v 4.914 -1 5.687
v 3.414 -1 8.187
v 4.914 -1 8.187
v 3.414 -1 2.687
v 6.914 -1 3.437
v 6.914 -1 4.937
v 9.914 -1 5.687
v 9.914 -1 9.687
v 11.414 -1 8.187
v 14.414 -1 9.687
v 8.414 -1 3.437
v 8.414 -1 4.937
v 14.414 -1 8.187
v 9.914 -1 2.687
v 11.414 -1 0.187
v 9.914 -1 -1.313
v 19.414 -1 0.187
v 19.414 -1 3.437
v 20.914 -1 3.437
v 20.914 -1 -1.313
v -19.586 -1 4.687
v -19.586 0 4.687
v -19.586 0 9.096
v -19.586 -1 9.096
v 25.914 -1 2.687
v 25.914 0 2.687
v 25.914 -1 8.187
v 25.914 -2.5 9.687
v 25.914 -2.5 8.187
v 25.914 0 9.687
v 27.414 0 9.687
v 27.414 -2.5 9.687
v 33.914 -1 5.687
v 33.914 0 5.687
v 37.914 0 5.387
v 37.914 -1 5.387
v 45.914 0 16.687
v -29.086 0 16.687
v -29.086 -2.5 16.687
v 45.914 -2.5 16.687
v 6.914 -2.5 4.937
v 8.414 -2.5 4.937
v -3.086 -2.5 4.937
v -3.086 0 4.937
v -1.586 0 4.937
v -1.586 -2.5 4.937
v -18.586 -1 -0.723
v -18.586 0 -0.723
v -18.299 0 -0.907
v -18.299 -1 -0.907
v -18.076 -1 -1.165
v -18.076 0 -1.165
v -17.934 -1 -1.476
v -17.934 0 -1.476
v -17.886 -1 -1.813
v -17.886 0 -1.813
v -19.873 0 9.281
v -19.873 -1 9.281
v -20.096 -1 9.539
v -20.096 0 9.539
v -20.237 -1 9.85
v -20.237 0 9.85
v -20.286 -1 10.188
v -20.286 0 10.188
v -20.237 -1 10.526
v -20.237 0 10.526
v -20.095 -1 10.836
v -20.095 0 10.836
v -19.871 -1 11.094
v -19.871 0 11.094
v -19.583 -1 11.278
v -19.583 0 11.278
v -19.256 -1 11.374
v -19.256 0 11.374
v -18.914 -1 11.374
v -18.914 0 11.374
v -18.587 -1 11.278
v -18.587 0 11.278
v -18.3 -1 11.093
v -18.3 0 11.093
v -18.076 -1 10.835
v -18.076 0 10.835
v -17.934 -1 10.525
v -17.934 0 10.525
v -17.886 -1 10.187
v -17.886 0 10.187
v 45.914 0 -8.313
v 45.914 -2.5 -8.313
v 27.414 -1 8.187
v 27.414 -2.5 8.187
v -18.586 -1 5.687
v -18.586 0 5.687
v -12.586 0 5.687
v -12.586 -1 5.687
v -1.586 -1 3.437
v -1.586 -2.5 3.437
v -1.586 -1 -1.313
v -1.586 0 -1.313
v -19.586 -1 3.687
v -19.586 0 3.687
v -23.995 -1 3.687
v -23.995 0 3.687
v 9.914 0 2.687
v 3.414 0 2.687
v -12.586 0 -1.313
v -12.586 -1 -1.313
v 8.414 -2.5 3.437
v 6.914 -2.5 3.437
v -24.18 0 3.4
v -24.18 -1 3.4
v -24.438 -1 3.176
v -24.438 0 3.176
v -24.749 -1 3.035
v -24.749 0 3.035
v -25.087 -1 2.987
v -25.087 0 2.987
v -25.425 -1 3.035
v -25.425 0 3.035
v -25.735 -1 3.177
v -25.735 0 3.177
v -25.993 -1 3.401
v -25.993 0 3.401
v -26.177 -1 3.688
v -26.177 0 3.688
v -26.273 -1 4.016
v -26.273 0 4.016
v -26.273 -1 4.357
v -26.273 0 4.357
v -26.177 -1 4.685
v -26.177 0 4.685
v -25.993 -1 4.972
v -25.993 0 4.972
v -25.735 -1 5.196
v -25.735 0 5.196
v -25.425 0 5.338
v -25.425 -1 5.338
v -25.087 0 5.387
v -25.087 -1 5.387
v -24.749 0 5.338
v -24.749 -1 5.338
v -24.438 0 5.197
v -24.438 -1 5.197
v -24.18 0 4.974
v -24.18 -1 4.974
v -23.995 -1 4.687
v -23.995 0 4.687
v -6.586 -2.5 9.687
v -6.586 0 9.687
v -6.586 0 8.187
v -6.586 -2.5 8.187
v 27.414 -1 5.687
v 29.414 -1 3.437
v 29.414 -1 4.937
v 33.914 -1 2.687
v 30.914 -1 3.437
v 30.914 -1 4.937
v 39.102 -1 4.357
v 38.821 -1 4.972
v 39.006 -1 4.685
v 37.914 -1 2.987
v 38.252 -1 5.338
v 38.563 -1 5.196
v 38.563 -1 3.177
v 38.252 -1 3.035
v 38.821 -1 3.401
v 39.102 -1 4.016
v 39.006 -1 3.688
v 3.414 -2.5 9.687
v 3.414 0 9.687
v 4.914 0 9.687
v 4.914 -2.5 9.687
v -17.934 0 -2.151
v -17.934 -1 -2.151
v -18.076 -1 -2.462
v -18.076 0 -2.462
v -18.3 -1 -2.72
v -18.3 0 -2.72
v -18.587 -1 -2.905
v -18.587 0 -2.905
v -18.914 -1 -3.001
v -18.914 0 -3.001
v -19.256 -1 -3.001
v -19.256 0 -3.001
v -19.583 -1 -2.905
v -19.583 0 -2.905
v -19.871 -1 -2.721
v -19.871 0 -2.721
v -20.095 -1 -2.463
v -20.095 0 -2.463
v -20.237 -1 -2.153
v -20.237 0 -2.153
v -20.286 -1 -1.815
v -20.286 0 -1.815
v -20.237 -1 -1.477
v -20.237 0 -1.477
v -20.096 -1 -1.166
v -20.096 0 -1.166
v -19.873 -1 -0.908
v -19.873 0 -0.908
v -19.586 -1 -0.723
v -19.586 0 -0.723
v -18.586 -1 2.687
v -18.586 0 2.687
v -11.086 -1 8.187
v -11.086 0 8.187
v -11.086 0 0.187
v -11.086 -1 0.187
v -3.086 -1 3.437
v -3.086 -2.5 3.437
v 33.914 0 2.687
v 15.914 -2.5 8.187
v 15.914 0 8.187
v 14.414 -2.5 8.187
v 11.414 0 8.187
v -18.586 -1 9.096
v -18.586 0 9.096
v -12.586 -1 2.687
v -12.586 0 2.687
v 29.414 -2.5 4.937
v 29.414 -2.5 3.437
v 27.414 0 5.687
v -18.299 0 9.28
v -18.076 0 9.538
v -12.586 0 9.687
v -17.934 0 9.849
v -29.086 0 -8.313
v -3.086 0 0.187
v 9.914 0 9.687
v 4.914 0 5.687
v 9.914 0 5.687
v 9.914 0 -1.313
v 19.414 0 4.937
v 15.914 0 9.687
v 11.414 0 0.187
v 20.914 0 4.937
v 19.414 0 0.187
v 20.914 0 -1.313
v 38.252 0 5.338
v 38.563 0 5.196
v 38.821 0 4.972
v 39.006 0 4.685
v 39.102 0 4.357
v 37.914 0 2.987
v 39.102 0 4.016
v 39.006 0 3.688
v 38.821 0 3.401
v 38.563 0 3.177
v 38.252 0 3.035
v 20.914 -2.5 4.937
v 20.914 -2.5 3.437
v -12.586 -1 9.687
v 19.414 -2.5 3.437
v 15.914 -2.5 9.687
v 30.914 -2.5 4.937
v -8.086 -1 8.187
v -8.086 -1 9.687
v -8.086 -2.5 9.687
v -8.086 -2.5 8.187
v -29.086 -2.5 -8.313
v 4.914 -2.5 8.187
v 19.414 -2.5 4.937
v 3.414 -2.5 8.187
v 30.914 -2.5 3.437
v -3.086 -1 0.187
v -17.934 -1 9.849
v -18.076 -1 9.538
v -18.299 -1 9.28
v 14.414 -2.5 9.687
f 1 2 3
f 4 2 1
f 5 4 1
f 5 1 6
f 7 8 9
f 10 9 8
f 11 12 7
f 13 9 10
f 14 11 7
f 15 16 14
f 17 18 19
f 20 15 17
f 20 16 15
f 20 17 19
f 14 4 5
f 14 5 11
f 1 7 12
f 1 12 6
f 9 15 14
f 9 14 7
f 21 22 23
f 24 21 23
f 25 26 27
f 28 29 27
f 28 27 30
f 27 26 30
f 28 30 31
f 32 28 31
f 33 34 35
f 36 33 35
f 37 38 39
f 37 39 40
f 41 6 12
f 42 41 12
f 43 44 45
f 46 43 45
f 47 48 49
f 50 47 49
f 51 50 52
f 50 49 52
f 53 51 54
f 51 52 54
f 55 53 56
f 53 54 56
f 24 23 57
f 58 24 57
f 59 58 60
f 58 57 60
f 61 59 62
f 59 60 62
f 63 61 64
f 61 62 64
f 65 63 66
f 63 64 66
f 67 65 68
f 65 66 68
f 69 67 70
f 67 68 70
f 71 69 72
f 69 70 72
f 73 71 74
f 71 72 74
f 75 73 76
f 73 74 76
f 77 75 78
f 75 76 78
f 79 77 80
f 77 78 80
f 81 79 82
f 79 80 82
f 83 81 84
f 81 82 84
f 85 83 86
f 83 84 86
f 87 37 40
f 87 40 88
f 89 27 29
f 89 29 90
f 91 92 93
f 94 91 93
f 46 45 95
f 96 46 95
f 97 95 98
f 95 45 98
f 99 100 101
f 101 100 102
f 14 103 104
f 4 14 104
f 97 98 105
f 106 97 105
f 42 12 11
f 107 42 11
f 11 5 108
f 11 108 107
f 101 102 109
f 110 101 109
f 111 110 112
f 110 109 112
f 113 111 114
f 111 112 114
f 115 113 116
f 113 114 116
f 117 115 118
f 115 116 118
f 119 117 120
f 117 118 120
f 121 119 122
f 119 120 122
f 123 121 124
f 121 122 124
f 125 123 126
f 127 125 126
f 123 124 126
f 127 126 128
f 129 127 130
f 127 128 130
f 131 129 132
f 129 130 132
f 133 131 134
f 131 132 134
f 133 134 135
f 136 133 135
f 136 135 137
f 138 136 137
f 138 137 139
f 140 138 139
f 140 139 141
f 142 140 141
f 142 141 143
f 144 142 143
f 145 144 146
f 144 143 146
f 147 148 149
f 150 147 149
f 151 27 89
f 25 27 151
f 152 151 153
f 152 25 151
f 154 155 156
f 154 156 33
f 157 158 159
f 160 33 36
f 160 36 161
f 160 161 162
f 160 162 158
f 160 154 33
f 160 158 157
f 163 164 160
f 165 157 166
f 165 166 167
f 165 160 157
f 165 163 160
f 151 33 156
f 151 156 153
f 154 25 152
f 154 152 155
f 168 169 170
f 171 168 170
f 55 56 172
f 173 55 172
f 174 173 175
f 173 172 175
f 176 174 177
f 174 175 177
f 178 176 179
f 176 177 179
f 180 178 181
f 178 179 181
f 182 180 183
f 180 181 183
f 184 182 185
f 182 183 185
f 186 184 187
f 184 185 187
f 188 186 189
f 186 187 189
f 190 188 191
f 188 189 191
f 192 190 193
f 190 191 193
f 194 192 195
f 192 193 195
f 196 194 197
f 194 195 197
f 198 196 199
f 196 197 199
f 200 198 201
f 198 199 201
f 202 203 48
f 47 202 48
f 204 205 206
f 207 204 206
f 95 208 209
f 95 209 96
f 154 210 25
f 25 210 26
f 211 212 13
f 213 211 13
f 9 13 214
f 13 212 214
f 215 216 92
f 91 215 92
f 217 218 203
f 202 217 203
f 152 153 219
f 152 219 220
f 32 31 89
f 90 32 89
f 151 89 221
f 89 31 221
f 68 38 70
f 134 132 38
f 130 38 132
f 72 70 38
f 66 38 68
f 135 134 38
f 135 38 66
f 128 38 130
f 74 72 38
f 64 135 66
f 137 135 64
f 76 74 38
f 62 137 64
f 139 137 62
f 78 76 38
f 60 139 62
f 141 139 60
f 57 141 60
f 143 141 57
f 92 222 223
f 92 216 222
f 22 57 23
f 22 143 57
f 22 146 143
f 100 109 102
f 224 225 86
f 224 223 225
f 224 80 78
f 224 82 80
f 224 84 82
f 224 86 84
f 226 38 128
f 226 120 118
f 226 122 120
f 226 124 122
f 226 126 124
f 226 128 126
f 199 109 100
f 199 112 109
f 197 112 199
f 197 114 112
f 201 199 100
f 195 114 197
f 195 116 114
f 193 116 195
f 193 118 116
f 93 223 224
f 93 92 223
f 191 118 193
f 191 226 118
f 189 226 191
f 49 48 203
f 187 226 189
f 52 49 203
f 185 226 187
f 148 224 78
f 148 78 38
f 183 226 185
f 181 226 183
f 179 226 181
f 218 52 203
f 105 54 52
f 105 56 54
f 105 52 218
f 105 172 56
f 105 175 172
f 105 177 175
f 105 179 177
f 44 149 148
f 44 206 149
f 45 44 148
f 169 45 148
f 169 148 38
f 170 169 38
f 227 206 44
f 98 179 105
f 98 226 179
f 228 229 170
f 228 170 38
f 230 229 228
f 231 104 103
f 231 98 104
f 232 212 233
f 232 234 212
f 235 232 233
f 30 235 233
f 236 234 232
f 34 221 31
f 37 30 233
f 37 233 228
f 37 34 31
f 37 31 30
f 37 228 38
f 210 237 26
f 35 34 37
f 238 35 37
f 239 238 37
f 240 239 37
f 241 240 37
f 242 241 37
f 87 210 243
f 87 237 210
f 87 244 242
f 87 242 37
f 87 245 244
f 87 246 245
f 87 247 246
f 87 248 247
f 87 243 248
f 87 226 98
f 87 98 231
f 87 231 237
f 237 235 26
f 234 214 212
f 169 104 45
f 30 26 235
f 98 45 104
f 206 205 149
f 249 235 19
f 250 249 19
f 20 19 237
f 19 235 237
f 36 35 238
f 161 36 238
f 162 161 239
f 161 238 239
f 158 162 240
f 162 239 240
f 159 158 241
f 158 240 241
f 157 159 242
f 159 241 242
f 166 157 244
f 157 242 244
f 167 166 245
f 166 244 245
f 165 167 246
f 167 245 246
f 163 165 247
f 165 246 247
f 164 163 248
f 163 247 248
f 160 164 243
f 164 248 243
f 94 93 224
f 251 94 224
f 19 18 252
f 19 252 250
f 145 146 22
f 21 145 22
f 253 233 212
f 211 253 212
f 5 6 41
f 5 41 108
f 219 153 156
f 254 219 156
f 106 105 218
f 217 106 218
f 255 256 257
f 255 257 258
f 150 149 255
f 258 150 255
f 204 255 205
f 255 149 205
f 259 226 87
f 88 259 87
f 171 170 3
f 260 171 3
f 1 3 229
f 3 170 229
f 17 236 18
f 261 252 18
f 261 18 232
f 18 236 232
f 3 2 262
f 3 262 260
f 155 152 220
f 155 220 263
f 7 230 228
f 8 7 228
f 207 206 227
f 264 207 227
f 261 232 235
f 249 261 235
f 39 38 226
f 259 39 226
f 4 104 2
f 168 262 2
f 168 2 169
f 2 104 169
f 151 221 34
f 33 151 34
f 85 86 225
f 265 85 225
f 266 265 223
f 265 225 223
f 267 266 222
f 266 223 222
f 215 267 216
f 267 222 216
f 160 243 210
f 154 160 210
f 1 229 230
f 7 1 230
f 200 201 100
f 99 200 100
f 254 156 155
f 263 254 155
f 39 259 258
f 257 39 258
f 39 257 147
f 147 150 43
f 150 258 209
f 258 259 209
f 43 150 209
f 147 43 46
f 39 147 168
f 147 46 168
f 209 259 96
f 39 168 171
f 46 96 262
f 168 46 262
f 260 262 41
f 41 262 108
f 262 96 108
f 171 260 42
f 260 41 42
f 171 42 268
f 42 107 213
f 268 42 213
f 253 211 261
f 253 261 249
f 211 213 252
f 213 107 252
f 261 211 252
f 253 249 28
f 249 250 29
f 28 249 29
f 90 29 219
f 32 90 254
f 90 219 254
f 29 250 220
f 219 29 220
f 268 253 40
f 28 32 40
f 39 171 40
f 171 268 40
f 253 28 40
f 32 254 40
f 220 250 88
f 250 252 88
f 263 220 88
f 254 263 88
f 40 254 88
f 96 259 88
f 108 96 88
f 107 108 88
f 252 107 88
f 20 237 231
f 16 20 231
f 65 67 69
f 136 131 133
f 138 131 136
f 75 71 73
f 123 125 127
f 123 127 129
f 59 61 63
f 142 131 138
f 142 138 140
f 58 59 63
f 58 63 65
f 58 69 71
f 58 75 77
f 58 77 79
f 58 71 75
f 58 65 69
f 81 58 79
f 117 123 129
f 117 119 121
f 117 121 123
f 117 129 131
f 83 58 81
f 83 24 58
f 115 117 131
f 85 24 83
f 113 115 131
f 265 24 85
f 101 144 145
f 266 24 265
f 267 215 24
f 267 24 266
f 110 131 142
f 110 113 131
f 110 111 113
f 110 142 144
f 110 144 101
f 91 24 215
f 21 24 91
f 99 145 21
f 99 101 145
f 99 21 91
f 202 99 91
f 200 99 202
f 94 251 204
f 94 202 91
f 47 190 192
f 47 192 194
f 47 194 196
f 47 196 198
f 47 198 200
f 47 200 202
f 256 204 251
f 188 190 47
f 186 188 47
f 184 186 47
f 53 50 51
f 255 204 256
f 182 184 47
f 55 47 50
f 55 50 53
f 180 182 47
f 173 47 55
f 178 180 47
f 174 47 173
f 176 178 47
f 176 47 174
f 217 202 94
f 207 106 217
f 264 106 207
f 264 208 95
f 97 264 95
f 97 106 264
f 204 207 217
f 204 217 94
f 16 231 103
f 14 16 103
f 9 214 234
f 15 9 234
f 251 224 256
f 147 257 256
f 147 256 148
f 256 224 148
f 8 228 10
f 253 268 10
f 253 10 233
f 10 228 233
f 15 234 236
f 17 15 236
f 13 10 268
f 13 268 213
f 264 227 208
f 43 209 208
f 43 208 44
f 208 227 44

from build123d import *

# Parameters (mm, degrees)
SKETCH2_W           = 75
SKETCH2_H           = 25
BOSS_EXTRUDE1_DEPTH = 2.5
CUT_EXTRUDE1_DEPTH  = 1
SKETCH3_W           = 1.5
SKETCH3_H           = 1.5
CUT_EXTRUDE2_DEPTH  = 3.5
SKETCH4_W           = 0.5
SKETCH4_H           = 1
CUT_EXTRUDE3_DEPTH  = 1


with BuildPart() as part:
    # Sketch2 → Boss-Extrude1 (new body)
    with BuildSketch(Plane(origin=(0, 0, 0), x_dir=(1, 0, 0), z_dir=(0, 1, 0))):
        with Locations((8.414308894, -4.186562074)):
            Rectangle(SKETCH2_W, SKETCH2_H)
    extrude(amount=-BOSS_EXTRUDE1_DEPTH)

    # Sketch1 → Cut-Extrude1 (cut)
    with BuildSketch(Plane(origin=(0, 0, 0), x_dir=(1, 0, 0), z_dir=(0, 1, 0))):
        Polygon((-12.585691106, -2.686562074), (-19.085691106, -2.686562074), (-19.085691106, -5.686562074), (-12.585691106, -5.686562074), (-12.585691106, -9.686562074), (-6.585691106, -9.686562074), (-6.585691106, -8.186562074), (-11.085691106, -8.186562074), (-11.085691106, -0.186562074), (-3.085691106, -0.186562074), (-3.085691106, -4.936562074), (-1.585691106, -4.936562074), (-1.585691106, 1.313437926), (-12.585691106, 1.313437926), align=None)
        Polygon((9.914308894, -2.686562074), (3.414308894, -2.686562074), (3.414308894, -9.686562074), (4.914308894, -9.686562074), (4.914308894, -5.686562074), (9.914308894, -5.686562074), (9.914308894, -9.686562074), (15.914308894, -9.686562074), (15.914308894, -8.186562074), (11.414308894, -8.186562074), (11.414308894, -0.186562074), (19.414308894, -0.186562074), (19.414308894, -4.936562074), (20.914308894, -4.936562074), (20.914308894, 1.313437926), (9.914308894, 1.313437926), align=None)
        Polygon((33.914308894, -2.686562074), (25.914308894, -2.686562074), (25.914308894, -9.686562074), (27.414308894, -9.686562074), (27.414308894, -5.686562074), (33.914308894, -5.686562074), align=None)
    extrude(amount=-CUT_EXTRUDE1_DEPTH, mode=Mode.SUBTRACT)

    # Sketch3 → Cut-Extrude2 (cut, through all)
    with BuildSketch(Plane(origin=(0, 0, 0), x_dir=(1, 0, 0), z_dir=(0, 1, 0))):
        with Locations((-7.335691106, -8.936562074)):
            Rectangle(SKETCH3_W, SKETCH3_H)
        with Locations((-2.335691106, -4.186562074)):
            Rectangle(SKETCH3_W, SKETCH3_H)
        with Locations((4.164308894, -8.936562074)):
            Rectangle(SKETCH3_W, SKETCH3_H)
        with Locations((30.164308894, -4.186562074)):
            Rectangle(SKETCH3_W, SKETCH3_H)
        with Locations((7.664308894, -4.186562074)):
            Rectangle(SKETCH3_W, SKETCH3_H)
        with Locations((15.164308894, -8.936562074)):
            Rectangle(SKETCH3_W, SKETCH3_H)
        with Locations((20.164308894, -4.186562074)):
            Rectangle(SKETCH3_W, SKETCH3_H)
        with Locations((26.664308894, -8.936562074)):
            Rectangle(SKETCH3_W, SKETCH3_H)
    extrude(amount=-CUT_EXTRUDE2_DEPTH, mode=Mode.SUBTRACT)

    # Sketch4 → Cut-Extrude3 (cut)
    with BuildSketch(Plane(origin=(0, 0, 0), x_dir=(1, 0, 0), z_dir=(0, 1, 0))):
        with BuildLine():
            ThreePointArc((37.914308894, -5.386562074), (39.114308894, -4.186562074), (37.914308894, -2.986562074))
            Line((37.914308894, -2.986562074), (33.914308894, -2.686562074))
            Line((33.914308894, -2.686562074), (33.914308894, -5.686562074))
            Line((33.914308894, -5.686562074), (37.914308894, -5.386562074))
        make_face()
        with BuildLine():
            ThreePointArc((-17.885691106, 1.813437926), (-19.733765176, 2.82338842), (-19.585691106, 0.722566715))
            Line((-19.585691106, 0.722566715), (-19.585691106, 1.813437926))
            ThreePointArc((-19.585691106, 1.813437926), (-19.085691106, 2.313437926), (-18.585691106, 1.813437926))
            Line((-18.585691106, 1.813437926), (-18.585691106, 0.722566715))
            ThreePointArc((-18.585691106, 0.722566715), (-18.075740612, 1.165363856), (-17.885691106, 1.813437926))
        make_face()
        with BuildLine():
            Line((-19.585691106, 1.813437926), (-19.585691106, 0.722566715))
            ThreePointArc((-19.585691106, 0.722566715), (-19.085691106, 0.613437926), (-18.585691106, 0.722566715))
            Line((-18.585691106, 0.722566715), (-18.585691106, 1.813437926))
            ThreePointArc((-18.585691106, 1.813437926), (-19.085691106, 2.313437926), (-19.585691106, 1.813437926))
        make_face()
        with BuildLine():
            Line((-19.585691106, 0.722566715), (-19.585691106, -3.686562074))
            Line((-19.585691106, -3.686562074), (-19.085691106, -3.686562074))
            Line((-19.085691106, -3.686562074), (-19.085691106, -2.686562074))
            Line((-19.085691106, -2.686562074), (-18.585691106, -2.686562074))
            Line((-18.585691106, -2.686562074), (-18.585691106, 0.722566715))
            ThreePointArc((-18.585691106, 0.722566715), (-19.085691106, 0.613437926), (-19.585691106, 0.722566715))
        make_face()
        with BuildLine():
            Line((-23.994819895, -4.686562074), (-25.085691106, -4.686562074))
            ThreePointArc((-25.085691106, -4.686562074), (-25.585691106, -4.186562074), (-25.085691106, -3.686562074))
            Line((-25.085691106, -3.686562074), (-23.994819895, -3.686562074))
            ThreePointArc((-23.994819895, -3.686562074), (-26.285691106, -4.186562074), (-23.994819895, -4.686562074))
        make_face()
        with BuildLine():
            ThreePointArc((-25.085691106, -3.686562074), (-25.585691106, -4.186562074), (-25.085691106, -4.686562074))
            Line((-25.085691106, -4.686562074), (-23.994819895, -4.686562074))
            ThreePointArc((-23.994819895, -4.686562074), (-23.913290694, -4.442447347), (-23.885691106, -4.186562074))
            ThreePointArc((-23.885691106, -4.186562074), (-23.913290694, -3.9306768), (-23.994819895, -3.686562074))
            Line((-23.994819895, -3.686562074), (-25.085691106, -3.686562074))
        make_face()
        with BuildLine():
            ThreePointArc((-23.885691106, -4.186562074), (-23.913290694, -4.442447347), (-23.994819895, -4.686562074))
            Line((-23.994819895, -4.686562074), (-19.585691106, -4.686562074))
            Line((-19.585691106, -4.686562074), (-19.585691106, -3.686562074))
            Line((-19.585691106, -3.686562074), (-23.994819895, -3.686562074))
            ThreePointArc((-23.994819895, -3.686562074), (-23.913290694, -3.9306768), (-23.885691106, -4.186562074))
        make_face()
        with Locations((-19.335691106, -4.186562074)):
            Rectangle(SKETCH4_W, SKETCH4_H)
        with BuildLine():
            Line((-19.085691106, -3.686562074), (-19.085691106, -4.686562074))
            ThreePointArc((-19.085691106, -4.686562074), (-18.732137716, -4.540115464), (-18.585691106, -4.186562074))
            ThreePointArc((-18.585691106, -4.186562074), (-18.732137716, -3.833008683), (-19.085691106, -3.686562074))
        make_face()
        with BuildLine():
            ThreePointArc((-19.085691106, -3.686562074), (-18.732137716, -3.833008683), (-18.585691106, -4.186562074))
            Line((-18.585691106, -4.186562074), (-18.585691106, -2.686562074))
            Line((-18.585691106, -2.686562074), (-19.085691106, -2.686562074))
            Line((-19.085691106, -2.686562074), (-19.085691106, -3.686562074))
        make_face()
        with BuildLine():
            Line((-19.585691106, -10.186562074), (-19.585691106, -9.095690862))
            ThreePointArc((-19.585691106, -9.095690862), (-19.733765176, -11.196512568), (-17.885691106, -10.186562074))
            ThreePointArc((-17.885691106, -10.186562074), (-18.075740612, -9.538488004), (-18.585691106, -9.095690862))
            Line((-18.585691106, -9.095690862), (-18.585691106, -10.186562074))
            ThreePointArc((-18.585691106, -10.186562074), (-19.085691106, -10.686562074), (-19.585691106, -10.186562074))
        make_face()
        with BuildLine():
            ThreePointArc((-18.585691106, -9.095690862), (-19.085691106, -8.986562074), (-19.585691106, -9.095690862))
            Line((-19.585691106, -9.095690862), (-19.585691106, -10.186562074))
            ThreePointArc((-19.585691106, -10.186562074), (-19.085691106, -10.686562074), (-18.585691106, -10.186562074))
            Line((-18.585691106, -10.186562074), (-18.585691106, -9.095690862))
        make_face()
        with BuildLine():
            Line((-19.085691106, -4.686562074), (-19.585691106, -4.686562074))
            Line((-19.585691106, -4.686562074), (-19.585691106, -9.095690862))
            ThreePointArc((-19.585691106, -9.095690862), (-19.085691106, -8.986562074), (-18.585691106, -9.095690862))
            Line((-18.585691106, -9.095690862), (-18.585691106, -5.686562074))
            Line((-18.585691106, -5.686562074), (-19.085691106, -5.686562074))
            Line((-19.085691106, -5.686562074), (-19.085691106, -4.686562074))
        make_face()
        with BuildLine():
            ThreePointArc((-18.585691106, -4.186562074), (-18.732137716, -4.540115464), (-19.085691106, -4.686562074))
            Line((-19.085691106, -4.686562074), (-19.085691106, -5.686562074))
            Line((-19.085691106, -5.686562074), (-18.585691106, -5.686562074))
            Line((-18.585691106, -5.686562074), (-18.585691106, -4.186562074))
        make_face()
    extrude(amount=-CUT_EXTRUDE3_DEPTH, mode=Mode.SUBTRACT)


solid = part.part
